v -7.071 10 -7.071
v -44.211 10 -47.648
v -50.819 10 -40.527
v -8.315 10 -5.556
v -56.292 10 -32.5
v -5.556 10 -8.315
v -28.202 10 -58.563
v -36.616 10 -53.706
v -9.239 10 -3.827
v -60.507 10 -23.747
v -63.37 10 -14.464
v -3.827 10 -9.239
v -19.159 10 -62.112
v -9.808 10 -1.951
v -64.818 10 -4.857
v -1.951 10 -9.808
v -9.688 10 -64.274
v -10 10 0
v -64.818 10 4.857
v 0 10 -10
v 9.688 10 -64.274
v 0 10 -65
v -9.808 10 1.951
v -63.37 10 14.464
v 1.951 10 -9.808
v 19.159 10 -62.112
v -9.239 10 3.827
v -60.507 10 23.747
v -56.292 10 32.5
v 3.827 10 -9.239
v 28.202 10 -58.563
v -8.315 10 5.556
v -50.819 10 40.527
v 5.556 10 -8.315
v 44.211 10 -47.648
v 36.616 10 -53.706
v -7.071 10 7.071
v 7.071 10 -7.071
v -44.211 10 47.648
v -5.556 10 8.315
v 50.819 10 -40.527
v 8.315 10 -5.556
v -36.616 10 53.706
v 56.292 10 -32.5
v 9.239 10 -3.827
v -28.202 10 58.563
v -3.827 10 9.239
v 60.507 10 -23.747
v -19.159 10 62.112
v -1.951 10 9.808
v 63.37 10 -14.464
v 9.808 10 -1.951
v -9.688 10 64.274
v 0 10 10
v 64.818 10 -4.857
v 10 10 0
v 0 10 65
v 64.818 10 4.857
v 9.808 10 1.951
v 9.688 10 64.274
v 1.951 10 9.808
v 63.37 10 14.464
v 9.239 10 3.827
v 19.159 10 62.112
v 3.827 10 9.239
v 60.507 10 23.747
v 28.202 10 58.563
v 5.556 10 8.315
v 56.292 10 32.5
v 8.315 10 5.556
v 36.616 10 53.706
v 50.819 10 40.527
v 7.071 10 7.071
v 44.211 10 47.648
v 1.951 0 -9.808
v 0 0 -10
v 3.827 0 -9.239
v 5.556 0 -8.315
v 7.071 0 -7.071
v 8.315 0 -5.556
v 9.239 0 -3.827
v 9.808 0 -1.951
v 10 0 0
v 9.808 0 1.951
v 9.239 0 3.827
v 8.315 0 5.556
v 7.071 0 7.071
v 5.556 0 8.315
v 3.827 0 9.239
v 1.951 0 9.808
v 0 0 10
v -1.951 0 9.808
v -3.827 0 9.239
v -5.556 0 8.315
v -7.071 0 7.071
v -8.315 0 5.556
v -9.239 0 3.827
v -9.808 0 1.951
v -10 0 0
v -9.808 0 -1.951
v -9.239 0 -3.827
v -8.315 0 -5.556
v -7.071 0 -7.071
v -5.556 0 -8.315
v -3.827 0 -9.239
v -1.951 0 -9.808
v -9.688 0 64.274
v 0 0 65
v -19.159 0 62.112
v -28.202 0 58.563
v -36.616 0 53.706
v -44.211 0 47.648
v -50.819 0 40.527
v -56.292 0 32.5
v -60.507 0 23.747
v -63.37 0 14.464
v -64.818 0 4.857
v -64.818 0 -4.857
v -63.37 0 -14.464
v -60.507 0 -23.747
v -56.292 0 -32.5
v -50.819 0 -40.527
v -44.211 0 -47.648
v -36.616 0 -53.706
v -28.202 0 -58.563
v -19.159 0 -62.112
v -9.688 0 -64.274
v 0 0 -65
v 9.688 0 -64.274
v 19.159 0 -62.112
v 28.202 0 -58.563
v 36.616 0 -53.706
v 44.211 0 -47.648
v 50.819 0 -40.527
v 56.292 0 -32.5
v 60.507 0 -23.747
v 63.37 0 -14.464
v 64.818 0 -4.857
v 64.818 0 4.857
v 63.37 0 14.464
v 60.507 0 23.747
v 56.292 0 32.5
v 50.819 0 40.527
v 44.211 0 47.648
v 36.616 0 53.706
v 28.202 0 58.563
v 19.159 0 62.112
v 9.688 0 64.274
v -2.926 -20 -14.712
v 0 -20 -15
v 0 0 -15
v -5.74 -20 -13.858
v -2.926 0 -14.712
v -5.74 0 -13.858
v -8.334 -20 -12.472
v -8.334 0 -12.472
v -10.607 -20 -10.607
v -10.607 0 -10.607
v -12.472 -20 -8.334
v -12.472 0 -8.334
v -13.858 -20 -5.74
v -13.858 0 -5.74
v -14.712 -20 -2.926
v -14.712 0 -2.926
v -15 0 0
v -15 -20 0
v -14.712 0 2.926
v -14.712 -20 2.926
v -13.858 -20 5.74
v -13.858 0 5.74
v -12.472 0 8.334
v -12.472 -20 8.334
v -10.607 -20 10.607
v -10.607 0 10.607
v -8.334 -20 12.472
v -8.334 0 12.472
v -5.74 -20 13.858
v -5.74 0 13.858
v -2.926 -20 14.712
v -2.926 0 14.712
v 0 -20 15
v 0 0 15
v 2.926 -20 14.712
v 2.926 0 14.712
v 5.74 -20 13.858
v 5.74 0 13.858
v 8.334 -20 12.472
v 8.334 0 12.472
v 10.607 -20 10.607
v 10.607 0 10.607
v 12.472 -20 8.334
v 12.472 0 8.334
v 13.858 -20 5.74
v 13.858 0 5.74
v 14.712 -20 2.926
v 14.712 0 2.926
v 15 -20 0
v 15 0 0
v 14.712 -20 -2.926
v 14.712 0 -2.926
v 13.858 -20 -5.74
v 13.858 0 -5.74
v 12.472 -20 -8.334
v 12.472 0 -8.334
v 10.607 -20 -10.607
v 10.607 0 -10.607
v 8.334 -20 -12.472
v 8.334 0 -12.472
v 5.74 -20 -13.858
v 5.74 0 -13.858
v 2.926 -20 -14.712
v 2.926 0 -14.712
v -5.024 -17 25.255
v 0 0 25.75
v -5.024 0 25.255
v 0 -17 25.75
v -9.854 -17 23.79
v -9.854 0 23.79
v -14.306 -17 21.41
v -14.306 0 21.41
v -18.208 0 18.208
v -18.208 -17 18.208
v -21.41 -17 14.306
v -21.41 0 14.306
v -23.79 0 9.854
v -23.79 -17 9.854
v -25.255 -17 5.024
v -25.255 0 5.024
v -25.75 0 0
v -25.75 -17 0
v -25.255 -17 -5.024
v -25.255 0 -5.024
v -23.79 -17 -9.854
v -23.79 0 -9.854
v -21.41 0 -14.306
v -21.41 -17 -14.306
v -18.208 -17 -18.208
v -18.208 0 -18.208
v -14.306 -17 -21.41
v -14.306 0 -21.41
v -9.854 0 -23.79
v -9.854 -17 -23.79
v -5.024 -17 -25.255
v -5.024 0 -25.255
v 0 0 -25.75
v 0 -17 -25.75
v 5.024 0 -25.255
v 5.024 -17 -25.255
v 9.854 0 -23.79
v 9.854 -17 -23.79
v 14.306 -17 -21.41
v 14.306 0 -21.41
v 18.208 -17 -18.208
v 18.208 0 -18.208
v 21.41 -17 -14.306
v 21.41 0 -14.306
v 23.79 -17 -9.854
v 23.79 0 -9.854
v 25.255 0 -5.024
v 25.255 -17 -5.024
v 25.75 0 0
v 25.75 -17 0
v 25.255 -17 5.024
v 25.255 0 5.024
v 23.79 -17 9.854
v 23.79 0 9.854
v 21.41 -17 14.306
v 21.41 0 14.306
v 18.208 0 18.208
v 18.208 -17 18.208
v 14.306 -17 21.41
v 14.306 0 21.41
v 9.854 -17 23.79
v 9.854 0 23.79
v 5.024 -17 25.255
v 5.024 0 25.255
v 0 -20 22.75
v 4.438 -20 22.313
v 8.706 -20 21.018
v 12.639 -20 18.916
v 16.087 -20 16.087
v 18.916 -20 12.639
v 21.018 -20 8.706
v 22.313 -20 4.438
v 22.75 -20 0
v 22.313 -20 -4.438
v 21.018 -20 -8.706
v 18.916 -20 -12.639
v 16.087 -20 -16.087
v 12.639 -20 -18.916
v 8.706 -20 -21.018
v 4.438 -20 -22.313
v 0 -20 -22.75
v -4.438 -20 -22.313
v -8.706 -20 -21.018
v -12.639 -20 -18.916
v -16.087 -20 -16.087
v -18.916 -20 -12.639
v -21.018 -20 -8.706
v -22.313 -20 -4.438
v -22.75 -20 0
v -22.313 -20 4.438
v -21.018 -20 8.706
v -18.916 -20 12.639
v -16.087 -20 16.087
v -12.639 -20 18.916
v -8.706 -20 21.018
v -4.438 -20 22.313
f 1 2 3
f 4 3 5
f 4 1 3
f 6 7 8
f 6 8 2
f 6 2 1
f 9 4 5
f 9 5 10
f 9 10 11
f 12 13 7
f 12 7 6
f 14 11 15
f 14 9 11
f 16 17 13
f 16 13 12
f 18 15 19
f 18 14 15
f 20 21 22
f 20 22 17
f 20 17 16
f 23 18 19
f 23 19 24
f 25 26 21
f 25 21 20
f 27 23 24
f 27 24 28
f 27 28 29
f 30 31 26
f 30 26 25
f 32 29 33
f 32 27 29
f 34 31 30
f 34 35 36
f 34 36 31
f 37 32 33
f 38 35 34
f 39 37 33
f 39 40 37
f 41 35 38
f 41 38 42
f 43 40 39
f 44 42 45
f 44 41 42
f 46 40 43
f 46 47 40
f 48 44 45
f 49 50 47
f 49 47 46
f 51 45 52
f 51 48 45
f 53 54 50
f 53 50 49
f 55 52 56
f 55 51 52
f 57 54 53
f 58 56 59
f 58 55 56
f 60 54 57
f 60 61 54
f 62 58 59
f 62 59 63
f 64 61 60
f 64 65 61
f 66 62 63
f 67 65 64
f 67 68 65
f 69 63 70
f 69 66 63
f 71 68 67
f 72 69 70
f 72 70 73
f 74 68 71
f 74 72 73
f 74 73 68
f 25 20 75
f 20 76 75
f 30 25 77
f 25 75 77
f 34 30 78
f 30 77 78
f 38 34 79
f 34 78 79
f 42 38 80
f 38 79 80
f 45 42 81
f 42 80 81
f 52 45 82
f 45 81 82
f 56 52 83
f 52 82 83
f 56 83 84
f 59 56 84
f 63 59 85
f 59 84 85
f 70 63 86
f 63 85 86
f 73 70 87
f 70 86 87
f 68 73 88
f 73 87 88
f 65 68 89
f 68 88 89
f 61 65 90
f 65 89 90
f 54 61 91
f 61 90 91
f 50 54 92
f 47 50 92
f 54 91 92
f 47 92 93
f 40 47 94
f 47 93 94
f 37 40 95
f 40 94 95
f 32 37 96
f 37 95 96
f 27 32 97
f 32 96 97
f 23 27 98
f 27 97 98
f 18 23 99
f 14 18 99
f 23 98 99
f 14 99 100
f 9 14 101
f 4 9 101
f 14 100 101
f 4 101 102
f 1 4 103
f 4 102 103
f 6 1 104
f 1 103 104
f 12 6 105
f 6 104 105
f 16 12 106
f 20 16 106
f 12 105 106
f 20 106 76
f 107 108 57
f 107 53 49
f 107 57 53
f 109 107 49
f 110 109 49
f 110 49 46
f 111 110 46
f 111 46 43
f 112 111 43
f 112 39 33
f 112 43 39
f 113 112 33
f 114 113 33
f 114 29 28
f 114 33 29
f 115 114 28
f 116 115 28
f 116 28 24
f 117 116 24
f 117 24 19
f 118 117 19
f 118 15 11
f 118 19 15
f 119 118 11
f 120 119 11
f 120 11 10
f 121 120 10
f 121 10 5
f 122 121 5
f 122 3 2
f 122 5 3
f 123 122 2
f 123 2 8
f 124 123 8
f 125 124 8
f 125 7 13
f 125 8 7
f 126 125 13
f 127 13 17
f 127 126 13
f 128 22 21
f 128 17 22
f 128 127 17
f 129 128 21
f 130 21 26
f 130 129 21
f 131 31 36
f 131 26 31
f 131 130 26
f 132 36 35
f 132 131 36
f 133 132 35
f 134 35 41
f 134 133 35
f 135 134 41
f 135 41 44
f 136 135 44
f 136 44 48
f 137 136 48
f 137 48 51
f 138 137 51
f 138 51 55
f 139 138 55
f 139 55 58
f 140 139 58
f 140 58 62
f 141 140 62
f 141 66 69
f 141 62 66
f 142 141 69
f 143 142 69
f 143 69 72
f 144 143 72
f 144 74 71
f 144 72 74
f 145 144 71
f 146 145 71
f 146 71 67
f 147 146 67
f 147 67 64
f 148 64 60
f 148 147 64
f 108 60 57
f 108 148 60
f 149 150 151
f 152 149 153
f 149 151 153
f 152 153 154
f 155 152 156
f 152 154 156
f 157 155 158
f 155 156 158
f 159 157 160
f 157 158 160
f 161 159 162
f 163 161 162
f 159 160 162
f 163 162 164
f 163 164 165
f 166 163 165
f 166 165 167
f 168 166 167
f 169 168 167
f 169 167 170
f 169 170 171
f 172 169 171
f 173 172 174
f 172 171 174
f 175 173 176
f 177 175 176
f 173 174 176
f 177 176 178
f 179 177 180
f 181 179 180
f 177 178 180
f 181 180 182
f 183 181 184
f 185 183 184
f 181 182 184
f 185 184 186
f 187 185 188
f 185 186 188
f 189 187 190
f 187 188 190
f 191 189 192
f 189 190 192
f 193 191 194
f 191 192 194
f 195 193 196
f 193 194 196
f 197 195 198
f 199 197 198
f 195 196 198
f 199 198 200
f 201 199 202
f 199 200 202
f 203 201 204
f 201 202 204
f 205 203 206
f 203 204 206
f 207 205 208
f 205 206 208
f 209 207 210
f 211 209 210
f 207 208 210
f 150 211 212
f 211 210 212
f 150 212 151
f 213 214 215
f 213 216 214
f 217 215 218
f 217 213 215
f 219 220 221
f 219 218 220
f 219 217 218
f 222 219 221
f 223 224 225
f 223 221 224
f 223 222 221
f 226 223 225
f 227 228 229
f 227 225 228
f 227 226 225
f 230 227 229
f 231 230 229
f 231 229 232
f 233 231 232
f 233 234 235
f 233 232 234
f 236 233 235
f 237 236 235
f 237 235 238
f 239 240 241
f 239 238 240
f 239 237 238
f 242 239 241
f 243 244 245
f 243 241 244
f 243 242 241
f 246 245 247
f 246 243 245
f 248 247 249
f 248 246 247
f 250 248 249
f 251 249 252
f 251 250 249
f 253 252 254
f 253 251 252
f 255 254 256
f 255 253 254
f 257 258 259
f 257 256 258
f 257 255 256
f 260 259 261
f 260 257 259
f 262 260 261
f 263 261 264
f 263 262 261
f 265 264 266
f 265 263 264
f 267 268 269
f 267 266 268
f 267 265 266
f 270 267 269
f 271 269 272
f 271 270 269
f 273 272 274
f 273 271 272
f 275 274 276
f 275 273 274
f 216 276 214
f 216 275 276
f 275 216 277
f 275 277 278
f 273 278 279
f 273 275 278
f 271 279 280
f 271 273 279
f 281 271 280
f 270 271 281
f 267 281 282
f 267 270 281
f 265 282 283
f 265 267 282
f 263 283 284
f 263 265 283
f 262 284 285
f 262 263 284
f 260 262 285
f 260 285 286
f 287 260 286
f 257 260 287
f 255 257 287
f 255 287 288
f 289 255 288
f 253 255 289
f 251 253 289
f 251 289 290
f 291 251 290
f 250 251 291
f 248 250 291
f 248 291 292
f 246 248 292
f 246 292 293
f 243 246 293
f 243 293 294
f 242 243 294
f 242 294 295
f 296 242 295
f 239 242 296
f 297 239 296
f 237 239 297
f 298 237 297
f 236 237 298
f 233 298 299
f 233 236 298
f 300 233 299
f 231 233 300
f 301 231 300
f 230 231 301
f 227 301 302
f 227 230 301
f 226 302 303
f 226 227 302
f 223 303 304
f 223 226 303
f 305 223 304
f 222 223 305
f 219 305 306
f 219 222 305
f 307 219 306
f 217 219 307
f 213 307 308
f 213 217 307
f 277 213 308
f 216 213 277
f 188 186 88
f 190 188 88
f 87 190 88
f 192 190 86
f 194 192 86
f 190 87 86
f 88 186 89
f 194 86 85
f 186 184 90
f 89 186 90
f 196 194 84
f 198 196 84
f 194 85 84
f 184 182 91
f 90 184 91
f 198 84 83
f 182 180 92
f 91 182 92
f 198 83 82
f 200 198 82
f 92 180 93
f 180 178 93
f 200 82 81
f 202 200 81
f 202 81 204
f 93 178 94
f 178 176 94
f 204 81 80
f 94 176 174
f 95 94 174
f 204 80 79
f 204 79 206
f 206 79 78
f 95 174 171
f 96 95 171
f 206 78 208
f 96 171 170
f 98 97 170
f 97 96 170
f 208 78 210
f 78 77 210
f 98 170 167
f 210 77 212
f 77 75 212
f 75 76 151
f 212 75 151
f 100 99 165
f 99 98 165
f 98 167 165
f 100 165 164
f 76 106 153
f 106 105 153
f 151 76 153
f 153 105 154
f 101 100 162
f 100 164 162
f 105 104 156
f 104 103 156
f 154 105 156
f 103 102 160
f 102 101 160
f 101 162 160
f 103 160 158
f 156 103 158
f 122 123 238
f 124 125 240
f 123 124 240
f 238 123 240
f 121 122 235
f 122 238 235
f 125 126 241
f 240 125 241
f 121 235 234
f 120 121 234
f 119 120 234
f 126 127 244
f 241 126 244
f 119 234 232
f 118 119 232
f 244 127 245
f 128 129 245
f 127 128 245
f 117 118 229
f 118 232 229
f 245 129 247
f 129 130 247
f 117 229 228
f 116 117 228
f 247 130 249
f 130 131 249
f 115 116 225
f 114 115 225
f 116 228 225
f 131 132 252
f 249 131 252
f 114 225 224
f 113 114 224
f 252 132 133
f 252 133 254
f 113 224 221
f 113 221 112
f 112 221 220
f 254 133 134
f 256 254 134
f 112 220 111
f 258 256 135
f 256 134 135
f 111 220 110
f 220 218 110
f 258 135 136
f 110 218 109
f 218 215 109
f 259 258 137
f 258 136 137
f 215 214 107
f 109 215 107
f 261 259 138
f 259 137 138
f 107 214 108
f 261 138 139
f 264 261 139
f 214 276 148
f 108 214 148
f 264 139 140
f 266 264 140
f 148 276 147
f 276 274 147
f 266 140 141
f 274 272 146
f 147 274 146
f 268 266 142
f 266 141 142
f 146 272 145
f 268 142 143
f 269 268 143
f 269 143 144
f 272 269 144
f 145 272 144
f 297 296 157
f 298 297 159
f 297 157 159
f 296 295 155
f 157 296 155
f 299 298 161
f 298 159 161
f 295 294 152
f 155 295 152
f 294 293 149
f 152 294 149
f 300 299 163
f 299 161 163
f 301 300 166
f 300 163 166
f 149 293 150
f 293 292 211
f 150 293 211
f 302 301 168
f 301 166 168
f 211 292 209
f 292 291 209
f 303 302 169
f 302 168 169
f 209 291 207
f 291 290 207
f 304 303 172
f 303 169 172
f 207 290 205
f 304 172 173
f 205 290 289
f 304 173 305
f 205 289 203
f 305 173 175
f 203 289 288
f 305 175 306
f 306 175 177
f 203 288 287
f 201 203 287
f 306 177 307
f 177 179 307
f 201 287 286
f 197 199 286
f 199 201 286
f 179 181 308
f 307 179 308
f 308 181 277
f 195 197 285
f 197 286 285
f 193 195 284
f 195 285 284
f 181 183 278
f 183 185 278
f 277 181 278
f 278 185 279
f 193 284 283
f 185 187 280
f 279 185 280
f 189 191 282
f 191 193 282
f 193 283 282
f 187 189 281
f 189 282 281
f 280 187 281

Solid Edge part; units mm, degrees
sketch "Sketch1" plane through (0, 0, 0) normal (1, 0, 0) x (0, 1, 0)
  line L0 (0, 65) -> (0, 25.75)
  line L1 (0, 25.75) -> (-20, 25.75)
  line L2 (-20, 25.75) -> (-20, 0)
  line L3 (-20, 0) -> (10, 0)
  line L4 (10, 0) -> (10, 65)
  line L5 (10, 65) -> (0, 65)
revolve "RevolvedProtrusion1" add sketch "Sketch1" angle 360 about axis through (0, -20, 0) along (0, 1, 0)
hole "Agujero_1" at (0, -20, 0) direction (0, 1, 0) diameter 20 end up to next counterbore diameter 30 counterbore depth 20
chamfer "Chaflán_1" distance 3 angle 45 1 edges at (0, -20, 25.75)
properties material "Acero ASTM A36"
